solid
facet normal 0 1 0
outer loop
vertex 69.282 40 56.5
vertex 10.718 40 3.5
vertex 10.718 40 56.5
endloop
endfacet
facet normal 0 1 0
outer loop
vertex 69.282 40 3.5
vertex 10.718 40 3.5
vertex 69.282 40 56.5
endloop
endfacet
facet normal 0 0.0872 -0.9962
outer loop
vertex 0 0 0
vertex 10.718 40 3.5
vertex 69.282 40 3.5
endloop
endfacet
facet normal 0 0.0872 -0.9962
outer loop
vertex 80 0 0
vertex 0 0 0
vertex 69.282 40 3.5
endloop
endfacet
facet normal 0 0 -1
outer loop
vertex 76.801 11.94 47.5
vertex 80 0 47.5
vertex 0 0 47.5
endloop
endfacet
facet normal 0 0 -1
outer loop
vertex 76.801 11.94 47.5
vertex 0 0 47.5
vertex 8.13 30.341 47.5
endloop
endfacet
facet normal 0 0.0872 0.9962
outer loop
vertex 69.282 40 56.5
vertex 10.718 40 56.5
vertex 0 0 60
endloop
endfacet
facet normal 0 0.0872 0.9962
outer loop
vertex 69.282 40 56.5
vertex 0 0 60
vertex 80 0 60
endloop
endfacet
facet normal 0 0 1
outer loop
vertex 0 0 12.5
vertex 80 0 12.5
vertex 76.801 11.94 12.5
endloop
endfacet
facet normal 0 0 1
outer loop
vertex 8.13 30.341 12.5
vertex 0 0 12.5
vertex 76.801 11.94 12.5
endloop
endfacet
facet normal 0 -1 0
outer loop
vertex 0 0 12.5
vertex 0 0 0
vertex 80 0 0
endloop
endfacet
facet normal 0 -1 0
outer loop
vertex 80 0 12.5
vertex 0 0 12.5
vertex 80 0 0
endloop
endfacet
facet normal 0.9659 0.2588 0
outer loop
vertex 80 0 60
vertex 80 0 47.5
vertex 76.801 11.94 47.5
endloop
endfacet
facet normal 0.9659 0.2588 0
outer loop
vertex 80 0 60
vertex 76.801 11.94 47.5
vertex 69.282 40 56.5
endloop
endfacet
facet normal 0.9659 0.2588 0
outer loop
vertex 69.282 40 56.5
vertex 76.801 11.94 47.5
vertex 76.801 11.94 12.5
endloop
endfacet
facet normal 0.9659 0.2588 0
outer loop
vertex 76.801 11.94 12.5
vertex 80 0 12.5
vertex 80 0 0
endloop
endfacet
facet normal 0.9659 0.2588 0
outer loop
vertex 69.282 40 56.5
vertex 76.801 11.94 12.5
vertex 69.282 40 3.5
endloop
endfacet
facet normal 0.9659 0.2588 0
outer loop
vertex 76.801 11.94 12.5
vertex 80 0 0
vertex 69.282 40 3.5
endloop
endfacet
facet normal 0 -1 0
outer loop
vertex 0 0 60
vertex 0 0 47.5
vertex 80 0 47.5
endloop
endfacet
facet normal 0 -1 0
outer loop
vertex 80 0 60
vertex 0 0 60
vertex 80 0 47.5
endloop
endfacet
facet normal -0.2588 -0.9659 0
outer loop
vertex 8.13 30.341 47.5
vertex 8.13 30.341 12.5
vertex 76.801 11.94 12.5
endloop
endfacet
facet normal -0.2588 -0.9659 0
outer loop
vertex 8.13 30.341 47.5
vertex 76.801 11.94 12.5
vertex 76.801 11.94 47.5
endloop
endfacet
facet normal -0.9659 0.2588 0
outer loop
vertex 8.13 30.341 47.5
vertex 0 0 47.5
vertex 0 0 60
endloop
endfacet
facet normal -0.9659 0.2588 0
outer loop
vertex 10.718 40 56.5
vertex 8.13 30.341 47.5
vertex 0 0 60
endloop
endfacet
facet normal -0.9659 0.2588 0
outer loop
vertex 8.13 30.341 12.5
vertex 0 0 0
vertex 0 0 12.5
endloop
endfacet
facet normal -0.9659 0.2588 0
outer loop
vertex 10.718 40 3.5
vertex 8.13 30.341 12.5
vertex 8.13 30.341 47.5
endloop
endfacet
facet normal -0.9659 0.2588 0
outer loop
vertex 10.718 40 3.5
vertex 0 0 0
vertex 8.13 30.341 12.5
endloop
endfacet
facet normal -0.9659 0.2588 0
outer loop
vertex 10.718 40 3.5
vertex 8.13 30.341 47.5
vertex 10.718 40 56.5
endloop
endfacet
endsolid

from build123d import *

# Parameters (mm, degrees)
SKETCH_5_W          = 80
SKETCH_5_H          = 40
EXTRUDE_3_DEPTH     = 60
DRAFT_6_ANGLE       = -15
DRAFT_7_ANGLE       = -5
SKETCH_8_W          = 35
SKETCH_8_H          = 31.411047216
CUT_EXTRUDE_1_DEPTH = 117


with BuildPart() as part:
    # 스케치5 → 보스-돌출3 (new body)
    with BuildSketch(Plane.XY):
        with Locations((40, 20)):
            Rectangle(SKETCH_5_W, SKETCH_5_H)
    extrude(amount=EXTRUDE_3_DEPTH)

    # 구배6
    draft_6_faces = [part.faces().sort_by_distance(p)[0] for p in [
        (80, 20, 30),
        (0, 20, 30),
    ]]
    draft(draft_6_faces, Plane(origin=(0, 0, 60), x_dir=(0, 0, -1), z_dir=(0, -1, 0)), DRAFT_6_ANGLE)

    # 구배7
    draft_7_faces = [part.faces().sort_by_distance(p)[0] for p in [
        (40, 18.968663077, 0),
        (40, 18.968663077, 60),
    ]]
    draft(draft_7_faces, Plane(origin=(0, 0, 60), x_dir=(0, 0, -1), z_dir=(0, -1, 0)), DRAFT_7_ANGLE)

    # 스케치8 → 컷-돌출1 (cut)
    with BuildSketch(Plane(origin=(0, 0, 0), x_dir=(0, 0, 1), z_dir=(-0.9659258262890682, 0.25881904510252135, 0))):
        with Locations((30, 15.705523608)):
            Rectangle(SKETCH_8_W, SKETCH_8_H)
    extrude(amount=-CUT_EXTRUDE_1_DEPTH, mode=Mode.SUBTRACT)


solid = part.part
